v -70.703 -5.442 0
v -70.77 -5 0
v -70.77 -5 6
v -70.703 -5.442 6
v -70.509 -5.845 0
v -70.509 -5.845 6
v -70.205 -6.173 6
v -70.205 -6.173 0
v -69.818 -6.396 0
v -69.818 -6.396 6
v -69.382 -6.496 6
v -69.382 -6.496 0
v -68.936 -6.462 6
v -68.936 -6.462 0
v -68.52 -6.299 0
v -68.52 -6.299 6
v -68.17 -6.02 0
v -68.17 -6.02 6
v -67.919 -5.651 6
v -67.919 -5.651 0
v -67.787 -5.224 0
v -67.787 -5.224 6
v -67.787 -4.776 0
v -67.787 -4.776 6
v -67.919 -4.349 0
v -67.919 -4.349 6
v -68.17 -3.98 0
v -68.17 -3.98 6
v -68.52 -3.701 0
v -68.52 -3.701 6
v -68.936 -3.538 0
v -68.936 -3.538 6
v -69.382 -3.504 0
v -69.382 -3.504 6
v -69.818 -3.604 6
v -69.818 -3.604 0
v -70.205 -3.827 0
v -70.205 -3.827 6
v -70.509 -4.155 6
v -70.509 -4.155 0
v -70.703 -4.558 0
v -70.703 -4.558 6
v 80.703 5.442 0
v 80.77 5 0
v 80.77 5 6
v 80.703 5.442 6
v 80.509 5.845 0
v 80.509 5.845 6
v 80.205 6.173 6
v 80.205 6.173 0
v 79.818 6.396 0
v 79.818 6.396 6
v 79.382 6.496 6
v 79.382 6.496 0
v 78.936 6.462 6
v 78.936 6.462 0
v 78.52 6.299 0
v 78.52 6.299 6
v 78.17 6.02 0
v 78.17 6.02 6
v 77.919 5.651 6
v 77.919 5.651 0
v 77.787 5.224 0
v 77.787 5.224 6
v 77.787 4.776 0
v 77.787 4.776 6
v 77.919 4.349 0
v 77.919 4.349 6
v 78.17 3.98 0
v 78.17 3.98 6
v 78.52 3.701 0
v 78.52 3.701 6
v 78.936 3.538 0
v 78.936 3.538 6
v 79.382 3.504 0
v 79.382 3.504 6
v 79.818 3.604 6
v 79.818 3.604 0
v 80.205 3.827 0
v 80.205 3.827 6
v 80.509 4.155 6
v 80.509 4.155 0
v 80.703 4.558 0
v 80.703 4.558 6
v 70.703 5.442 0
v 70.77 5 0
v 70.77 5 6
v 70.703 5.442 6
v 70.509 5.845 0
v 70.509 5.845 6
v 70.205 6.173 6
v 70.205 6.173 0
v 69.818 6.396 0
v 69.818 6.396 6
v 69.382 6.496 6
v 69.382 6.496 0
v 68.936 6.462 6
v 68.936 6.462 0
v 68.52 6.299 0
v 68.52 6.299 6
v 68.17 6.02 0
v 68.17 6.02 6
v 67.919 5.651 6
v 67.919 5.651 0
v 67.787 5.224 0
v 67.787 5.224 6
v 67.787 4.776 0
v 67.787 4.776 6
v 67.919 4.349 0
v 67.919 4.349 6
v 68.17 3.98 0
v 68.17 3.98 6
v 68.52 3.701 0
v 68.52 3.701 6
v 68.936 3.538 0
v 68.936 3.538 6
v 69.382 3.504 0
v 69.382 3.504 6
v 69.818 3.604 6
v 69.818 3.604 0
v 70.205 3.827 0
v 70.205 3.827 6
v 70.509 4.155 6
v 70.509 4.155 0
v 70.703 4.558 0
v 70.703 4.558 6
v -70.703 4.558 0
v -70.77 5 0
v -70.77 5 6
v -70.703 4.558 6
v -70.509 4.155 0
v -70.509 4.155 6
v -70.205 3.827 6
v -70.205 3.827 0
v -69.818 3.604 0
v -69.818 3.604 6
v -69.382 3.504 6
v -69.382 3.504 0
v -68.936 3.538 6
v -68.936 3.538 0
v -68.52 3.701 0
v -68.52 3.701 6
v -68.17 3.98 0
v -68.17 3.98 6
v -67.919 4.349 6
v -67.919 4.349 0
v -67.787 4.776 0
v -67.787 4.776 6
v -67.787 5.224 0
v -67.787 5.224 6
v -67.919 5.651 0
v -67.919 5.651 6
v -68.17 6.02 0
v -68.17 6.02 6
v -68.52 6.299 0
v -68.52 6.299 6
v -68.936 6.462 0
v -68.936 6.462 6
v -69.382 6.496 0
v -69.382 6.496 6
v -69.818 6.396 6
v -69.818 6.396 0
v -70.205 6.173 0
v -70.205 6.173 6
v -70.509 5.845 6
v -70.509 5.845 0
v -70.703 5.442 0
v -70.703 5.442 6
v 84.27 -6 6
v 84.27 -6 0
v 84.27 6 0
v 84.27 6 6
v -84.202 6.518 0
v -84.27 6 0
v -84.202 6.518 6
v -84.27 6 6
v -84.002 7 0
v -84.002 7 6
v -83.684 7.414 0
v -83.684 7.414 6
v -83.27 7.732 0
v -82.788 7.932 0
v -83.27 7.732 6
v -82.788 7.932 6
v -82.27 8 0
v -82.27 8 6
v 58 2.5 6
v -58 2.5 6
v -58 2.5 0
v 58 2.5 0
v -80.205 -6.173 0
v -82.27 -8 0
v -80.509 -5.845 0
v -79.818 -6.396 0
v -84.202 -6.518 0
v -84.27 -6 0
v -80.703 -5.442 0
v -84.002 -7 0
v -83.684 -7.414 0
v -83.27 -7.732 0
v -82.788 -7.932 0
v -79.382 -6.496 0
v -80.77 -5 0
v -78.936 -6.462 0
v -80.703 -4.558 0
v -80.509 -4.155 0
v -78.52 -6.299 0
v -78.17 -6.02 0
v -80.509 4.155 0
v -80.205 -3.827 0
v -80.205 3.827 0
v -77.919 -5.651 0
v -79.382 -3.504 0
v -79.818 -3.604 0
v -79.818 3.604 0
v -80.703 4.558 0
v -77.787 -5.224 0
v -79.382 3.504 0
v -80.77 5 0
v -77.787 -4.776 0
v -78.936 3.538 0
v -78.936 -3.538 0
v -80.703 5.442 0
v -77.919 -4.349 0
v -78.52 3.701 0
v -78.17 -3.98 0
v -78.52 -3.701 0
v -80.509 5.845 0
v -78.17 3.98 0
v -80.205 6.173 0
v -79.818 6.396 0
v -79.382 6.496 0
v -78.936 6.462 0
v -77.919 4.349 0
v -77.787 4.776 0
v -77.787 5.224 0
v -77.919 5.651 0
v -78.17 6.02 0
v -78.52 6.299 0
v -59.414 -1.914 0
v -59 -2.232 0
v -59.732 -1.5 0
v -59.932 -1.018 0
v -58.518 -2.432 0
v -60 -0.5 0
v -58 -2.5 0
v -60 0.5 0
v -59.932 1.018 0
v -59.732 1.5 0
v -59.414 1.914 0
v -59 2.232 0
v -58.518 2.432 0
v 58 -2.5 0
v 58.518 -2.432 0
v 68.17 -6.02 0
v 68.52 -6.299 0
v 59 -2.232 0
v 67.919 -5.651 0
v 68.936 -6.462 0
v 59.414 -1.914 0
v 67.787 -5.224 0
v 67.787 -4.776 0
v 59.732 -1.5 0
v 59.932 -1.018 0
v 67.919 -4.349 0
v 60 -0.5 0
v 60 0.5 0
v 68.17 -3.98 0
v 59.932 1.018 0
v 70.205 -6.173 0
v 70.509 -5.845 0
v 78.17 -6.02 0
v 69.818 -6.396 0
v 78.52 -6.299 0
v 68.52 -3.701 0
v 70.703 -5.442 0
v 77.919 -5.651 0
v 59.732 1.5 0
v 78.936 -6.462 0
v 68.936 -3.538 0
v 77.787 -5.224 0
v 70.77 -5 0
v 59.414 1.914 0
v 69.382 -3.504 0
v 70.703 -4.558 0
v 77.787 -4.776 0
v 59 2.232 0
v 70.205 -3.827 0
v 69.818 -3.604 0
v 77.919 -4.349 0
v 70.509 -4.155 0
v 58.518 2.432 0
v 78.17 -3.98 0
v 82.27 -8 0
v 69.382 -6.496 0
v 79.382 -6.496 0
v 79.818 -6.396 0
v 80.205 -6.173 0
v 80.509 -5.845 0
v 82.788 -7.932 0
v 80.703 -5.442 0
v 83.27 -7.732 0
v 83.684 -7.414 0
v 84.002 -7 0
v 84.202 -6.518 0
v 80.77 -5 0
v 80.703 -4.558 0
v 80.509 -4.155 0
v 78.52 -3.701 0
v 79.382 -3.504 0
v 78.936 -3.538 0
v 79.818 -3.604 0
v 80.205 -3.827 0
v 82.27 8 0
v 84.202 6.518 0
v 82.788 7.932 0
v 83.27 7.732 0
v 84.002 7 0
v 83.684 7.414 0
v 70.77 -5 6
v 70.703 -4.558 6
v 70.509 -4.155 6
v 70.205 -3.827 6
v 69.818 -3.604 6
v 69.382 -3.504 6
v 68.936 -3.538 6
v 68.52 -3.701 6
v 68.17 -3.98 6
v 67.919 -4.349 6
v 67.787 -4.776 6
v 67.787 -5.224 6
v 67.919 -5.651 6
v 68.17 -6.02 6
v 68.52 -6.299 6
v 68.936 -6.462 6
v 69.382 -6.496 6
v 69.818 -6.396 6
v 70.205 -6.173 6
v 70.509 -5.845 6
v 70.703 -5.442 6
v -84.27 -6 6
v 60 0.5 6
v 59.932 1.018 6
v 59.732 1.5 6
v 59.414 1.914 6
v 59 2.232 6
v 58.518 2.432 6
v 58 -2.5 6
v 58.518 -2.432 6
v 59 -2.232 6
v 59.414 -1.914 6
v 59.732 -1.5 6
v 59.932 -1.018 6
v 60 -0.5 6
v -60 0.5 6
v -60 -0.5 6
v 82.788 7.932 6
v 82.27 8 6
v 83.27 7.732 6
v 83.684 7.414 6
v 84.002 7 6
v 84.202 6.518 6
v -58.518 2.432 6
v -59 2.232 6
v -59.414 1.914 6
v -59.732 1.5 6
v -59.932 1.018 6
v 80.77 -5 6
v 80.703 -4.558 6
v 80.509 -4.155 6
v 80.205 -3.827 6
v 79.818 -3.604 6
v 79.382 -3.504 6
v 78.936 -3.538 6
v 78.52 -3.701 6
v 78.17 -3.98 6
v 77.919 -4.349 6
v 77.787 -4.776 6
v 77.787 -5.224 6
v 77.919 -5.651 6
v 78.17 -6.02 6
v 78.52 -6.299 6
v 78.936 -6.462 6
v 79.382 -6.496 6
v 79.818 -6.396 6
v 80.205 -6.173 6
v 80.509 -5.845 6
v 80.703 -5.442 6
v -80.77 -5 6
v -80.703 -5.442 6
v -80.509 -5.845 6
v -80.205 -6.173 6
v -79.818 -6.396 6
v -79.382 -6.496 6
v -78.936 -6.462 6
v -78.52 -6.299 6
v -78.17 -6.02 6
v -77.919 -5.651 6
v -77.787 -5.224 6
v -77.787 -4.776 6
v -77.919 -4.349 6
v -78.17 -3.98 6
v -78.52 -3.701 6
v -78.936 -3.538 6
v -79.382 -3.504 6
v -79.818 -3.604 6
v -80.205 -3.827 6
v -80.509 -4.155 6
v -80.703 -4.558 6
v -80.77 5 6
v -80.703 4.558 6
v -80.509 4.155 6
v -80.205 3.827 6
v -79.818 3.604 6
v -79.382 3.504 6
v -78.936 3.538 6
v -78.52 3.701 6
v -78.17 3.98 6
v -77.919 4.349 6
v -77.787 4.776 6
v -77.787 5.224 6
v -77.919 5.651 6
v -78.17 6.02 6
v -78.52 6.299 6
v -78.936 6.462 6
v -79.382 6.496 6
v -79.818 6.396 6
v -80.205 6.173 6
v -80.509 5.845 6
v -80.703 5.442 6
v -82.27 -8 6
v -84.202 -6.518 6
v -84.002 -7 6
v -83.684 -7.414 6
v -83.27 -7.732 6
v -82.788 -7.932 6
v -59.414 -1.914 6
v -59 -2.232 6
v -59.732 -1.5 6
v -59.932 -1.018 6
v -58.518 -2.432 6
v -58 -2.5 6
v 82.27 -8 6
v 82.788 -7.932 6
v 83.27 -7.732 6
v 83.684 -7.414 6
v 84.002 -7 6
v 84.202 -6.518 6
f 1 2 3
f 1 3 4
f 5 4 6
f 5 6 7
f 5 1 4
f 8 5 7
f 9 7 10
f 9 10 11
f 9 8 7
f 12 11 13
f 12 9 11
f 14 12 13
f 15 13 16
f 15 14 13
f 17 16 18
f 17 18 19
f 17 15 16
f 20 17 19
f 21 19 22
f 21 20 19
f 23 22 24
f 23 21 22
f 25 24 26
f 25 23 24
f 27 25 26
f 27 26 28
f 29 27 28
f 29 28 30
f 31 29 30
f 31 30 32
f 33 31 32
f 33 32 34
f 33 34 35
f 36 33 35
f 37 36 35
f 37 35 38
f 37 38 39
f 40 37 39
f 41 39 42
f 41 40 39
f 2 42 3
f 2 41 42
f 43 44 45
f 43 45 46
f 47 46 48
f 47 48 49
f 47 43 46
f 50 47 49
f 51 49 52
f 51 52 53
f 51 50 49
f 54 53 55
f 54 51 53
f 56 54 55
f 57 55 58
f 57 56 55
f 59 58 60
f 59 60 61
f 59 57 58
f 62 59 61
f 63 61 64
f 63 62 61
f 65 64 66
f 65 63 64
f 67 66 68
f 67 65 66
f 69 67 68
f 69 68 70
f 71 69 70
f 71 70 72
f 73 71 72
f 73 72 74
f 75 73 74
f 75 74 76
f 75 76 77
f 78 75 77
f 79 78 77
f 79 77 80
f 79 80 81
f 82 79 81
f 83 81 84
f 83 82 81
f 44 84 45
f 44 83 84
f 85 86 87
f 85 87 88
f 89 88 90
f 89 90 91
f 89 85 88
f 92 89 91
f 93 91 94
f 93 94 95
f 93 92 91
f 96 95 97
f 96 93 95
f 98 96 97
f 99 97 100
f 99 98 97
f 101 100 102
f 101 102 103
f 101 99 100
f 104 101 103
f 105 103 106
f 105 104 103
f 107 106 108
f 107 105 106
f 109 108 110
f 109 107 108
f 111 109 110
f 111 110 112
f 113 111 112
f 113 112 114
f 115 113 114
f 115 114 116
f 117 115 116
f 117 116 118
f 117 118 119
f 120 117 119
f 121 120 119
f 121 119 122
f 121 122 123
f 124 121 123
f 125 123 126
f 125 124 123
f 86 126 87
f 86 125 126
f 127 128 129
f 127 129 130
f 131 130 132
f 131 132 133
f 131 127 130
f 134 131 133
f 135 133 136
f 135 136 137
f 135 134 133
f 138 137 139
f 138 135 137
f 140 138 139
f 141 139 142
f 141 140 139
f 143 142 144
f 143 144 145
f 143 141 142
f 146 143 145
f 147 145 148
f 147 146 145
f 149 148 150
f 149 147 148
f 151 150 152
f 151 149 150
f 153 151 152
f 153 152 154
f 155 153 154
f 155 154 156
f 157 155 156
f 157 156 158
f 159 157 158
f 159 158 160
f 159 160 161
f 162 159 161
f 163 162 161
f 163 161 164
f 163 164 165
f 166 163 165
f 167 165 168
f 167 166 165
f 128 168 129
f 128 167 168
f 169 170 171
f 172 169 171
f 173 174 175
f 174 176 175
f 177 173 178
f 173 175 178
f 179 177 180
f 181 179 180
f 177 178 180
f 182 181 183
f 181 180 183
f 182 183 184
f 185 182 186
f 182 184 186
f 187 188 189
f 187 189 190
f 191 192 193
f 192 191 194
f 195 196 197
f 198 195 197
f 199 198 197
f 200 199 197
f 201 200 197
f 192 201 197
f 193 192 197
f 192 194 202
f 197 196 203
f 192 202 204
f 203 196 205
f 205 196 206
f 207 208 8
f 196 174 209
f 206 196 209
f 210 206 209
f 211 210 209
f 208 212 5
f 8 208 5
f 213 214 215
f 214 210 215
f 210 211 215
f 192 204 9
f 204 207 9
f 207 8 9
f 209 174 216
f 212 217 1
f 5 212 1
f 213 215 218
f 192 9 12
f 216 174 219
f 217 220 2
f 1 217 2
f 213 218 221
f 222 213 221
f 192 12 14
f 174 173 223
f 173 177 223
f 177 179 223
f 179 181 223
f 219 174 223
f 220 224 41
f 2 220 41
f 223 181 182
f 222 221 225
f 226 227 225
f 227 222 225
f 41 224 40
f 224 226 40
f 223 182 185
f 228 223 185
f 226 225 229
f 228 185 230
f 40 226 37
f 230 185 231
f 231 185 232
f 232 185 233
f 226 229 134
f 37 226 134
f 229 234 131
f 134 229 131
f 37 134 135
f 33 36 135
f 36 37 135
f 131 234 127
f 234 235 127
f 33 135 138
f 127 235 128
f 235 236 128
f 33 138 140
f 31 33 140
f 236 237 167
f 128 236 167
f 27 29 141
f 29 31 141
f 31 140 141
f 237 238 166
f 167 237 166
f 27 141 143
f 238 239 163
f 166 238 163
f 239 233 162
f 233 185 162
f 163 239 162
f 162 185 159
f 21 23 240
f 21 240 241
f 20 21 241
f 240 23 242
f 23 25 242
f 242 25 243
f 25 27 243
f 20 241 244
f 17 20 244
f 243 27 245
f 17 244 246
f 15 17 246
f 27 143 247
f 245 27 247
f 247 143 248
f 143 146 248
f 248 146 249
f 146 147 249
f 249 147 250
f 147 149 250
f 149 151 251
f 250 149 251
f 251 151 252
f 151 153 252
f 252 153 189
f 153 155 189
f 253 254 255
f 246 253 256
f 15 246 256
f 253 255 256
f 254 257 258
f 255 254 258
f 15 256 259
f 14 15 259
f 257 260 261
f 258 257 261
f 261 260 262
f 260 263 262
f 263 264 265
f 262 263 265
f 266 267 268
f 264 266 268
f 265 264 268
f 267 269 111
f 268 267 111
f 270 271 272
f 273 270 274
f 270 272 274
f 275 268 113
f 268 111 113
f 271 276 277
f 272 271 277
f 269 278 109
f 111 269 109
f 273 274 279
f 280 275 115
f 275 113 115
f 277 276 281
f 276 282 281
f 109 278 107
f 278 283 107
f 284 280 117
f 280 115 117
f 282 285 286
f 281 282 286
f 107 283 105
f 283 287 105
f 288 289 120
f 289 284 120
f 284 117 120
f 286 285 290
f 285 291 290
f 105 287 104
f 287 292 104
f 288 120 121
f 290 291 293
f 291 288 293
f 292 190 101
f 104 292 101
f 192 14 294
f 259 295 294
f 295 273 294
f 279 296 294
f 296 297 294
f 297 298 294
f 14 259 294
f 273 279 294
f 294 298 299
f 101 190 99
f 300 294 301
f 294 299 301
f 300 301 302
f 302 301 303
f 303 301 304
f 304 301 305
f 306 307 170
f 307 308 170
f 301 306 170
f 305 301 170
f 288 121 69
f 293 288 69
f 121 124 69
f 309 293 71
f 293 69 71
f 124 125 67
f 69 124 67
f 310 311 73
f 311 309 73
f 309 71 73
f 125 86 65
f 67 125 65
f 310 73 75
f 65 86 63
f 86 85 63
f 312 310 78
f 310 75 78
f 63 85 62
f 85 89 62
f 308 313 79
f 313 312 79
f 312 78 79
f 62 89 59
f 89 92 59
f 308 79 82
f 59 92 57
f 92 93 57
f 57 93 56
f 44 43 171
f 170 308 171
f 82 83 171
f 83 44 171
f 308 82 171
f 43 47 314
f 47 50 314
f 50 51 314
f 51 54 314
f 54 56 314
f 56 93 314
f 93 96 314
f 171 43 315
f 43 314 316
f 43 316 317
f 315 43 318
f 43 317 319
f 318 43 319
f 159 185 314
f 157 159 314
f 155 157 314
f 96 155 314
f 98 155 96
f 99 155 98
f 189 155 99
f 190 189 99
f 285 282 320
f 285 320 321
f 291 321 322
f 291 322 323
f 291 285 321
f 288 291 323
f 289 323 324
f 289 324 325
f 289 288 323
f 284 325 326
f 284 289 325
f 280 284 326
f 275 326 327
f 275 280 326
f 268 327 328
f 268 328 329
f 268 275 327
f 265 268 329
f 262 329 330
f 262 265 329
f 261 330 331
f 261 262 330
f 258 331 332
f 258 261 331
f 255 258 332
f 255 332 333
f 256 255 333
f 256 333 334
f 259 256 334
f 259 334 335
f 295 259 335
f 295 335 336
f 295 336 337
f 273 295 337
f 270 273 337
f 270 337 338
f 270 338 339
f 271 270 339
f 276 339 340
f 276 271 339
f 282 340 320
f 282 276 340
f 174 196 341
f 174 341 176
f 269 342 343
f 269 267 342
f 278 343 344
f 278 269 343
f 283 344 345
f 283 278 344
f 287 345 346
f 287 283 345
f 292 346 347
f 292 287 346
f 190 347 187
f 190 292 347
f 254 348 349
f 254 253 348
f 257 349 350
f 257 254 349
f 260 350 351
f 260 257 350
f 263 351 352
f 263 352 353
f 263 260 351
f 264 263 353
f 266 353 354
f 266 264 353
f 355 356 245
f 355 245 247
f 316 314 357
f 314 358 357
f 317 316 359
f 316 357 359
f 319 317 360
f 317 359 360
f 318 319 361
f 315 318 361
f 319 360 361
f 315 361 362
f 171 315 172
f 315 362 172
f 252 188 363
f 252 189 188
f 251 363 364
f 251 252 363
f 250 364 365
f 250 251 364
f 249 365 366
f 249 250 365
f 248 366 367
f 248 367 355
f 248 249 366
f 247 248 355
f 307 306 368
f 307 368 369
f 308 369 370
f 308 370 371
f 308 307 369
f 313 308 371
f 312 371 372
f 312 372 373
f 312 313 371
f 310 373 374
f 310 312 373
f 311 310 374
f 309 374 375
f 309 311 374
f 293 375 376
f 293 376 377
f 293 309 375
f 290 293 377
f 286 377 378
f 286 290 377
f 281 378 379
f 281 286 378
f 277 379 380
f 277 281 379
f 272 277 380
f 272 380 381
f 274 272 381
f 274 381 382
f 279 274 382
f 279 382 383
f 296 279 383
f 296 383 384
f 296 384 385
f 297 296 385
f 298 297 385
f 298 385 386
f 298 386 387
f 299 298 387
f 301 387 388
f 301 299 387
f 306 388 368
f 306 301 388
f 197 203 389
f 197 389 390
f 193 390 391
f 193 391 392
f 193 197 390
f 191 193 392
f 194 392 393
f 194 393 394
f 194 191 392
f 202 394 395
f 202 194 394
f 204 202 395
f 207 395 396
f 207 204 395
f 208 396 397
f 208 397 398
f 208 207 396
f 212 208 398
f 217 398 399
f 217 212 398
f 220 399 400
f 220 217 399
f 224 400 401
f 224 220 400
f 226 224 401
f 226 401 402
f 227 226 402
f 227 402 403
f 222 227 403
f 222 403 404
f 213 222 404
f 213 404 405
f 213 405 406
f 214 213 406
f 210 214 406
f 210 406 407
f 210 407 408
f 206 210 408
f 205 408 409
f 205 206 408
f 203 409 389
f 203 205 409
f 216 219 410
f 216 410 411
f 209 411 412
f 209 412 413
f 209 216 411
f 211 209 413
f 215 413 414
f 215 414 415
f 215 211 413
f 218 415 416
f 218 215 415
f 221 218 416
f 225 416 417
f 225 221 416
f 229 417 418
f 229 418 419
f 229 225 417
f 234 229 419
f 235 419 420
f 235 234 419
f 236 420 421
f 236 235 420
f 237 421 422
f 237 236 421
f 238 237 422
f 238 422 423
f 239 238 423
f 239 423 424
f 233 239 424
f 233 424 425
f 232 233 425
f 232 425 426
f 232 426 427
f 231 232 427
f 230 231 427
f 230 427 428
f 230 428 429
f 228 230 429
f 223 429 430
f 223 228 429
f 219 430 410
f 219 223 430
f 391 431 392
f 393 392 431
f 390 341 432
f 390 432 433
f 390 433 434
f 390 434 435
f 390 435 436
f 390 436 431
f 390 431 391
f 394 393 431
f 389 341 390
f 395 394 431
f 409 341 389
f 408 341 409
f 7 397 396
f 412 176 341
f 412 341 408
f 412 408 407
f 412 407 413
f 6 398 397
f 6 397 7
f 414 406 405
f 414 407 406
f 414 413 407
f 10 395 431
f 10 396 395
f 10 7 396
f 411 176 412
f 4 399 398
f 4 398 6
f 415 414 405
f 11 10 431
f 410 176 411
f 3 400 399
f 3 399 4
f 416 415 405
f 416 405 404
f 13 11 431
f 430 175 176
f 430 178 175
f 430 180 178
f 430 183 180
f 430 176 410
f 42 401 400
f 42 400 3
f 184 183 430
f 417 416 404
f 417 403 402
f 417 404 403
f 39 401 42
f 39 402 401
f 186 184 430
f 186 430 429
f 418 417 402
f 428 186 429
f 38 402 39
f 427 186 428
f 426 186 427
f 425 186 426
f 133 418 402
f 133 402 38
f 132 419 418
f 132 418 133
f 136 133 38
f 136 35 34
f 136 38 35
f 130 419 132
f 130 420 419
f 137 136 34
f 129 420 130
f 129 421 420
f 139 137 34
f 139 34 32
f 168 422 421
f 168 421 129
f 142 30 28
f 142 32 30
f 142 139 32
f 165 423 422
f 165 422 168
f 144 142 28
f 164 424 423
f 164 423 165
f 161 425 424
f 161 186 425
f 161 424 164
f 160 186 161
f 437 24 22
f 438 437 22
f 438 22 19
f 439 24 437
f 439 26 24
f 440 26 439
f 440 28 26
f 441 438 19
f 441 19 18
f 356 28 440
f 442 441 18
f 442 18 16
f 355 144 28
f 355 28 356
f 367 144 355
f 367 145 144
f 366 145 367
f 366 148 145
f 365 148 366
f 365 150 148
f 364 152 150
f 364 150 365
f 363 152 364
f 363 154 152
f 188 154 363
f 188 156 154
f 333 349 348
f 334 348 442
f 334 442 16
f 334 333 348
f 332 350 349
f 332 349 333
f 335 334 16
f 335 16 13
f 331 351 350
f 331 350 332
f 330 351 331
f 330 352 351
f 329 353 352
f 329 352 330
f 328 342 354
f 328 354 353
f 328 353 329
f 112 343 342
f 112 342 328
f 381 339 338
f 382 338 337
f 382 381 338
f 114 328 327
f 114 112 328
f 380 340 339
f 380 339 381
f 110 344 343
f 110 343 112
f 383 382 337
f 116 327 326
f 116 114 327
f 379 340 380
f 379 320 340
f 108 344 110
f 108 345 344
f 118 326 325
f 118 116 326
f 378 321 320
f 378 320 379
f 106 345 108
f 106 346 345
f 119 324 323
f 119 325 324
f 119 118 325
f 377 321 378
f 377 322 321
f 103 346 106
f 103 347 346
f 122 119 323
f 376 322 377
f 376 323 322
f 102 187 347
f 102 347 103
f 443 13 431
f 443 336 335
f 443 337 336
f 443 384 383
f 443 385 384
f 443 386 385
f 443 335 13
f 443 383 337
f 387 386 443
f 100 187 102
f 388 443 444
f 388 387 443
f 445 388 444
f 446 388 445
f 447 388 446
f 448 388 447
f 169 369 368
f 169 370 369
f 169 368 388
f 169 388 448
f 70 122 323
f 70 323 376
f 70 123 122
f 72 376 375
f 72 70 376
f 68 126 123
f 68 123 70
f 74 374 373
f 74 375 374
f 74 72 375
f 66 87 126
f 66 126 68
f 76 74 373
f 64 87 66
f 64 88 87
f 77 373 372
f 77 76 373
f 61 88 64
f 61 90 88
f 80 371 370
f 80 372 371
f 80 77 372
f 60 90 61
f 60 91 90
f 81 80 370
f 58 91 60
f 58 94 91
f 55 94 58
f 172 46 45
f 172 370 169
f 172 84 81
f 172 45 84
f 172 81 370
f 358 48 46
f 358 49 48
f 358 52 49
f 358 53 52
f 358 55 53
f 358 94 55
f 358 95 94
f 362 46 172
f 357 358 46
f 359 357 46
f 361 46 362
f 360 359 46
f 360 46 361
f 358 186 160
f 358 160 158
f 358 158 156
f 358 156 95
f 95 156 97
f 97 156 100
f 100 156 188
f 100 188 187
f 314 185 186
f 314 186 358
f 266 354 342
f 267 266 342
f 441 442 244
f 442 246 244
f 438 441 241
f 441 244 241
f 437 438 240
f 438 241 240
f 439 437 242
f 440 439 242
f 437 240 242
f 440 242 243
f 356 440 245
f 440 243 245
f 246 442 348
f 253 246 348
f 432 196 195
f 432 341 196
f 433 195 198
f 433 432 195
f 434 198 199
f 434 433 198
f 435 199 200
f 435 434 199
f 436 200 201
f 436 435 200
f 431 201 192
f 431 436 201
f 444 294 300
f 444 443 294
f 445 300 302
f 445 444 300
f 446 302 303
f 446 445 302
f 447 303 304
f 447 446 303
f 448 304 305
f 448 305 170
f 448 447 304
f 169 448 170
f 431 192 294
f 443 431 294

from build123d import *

# Parameters (mm, degrees)
SKETCH_1_W          = 168.54
SKETCH_1_H          = 16
SKETCH_1_R          = 1.5
EXTRUDE_1_DEPTH     = 6
FILLET_1_R          = 2
SKETCH_2_W          = 120
SKETCH_2_H          = 5
CUT_EXTRUDE_1_DEPTH = 6
FILLET_2_R          = 2


with BuildPart() as part:
    # 草图1 → 凸台-拉伸1 (new body)
    with BuildSketch(Plane.XY):
        Rectangle(SKETCH_1_W, SKETCH_1_H)
        with Locations((79.27, 5)):
            Circle(SKETCH_1_R, mode=Mode.SUBTRACT)
        with Locations((69.27, 5)):
            Circle(SKETCH_1_R, mode=Mode.SUBTRACT)
        with Locations((69.27, -5)):
            Circle(SKETCH_1_R, mode=Mode.SUBTRACT)
        with Locations((79.27, -5)):
            Circle(SKETCH_1_R, mode=Mode.SUBTRACT)
        with Locations(Location((-79.27, -5, 0), (0, 0, 180))):
            Circle(SKETCH_1_R, mode=Mode.SUBTRACT)
        with Locations(Location((-69.27, -5, 0), (0, 0, 180))):
            Circle(SKETCH_1_R, mode=Mode.SUBTRACT)
        with Locations(Location((-69.27, 5, 0), (0, 0, 180))):
            Circle(SKETCH_1_R, mode=Mode.SUBTRACT)
        with Locations(Location((-79.27, 5, 0), (0, 0, 180))):
            Circle(SKETCH_1_R, mode=Mode.SUBTRACT)
    extrude(amount=EXTRUDE_1_DEPTH)

    # 圆角1
    fillet_1_edges = [part.edges().sort_by_distance(p)[0] for p in [
        (84.27, -8, 3),
        (-84.27, -8, 3),
        (-84.27, 8, 3),
        (84.27, 8, 3),
    ]]
    fillet(fillet_1_edges, radius=FILLET_1_R)

    # 草图2 → 切除-拉伸1 (cut)
    with BuildSketch(Plane.XY.offset(6)):
        Rectangle(SKETCH_2_W, SKETCH_2_H)
    extrude(amount=-CUT_EXTRUDE_1_DEPTH, mode=Mode.SUBTRACT)

    # 圆角2
    fillet_2_edges = [part.edges().sort_by_distance(p)[0] for p in [
        (60, 2.5, 3),
        (60, -2.5, 3),
        (-60, -2.5, 3),
        (-60, 2.5, 3),
    ]]
    fillet(fillet_2_edges, radius=FILLET_2_R)


solid = part.part
